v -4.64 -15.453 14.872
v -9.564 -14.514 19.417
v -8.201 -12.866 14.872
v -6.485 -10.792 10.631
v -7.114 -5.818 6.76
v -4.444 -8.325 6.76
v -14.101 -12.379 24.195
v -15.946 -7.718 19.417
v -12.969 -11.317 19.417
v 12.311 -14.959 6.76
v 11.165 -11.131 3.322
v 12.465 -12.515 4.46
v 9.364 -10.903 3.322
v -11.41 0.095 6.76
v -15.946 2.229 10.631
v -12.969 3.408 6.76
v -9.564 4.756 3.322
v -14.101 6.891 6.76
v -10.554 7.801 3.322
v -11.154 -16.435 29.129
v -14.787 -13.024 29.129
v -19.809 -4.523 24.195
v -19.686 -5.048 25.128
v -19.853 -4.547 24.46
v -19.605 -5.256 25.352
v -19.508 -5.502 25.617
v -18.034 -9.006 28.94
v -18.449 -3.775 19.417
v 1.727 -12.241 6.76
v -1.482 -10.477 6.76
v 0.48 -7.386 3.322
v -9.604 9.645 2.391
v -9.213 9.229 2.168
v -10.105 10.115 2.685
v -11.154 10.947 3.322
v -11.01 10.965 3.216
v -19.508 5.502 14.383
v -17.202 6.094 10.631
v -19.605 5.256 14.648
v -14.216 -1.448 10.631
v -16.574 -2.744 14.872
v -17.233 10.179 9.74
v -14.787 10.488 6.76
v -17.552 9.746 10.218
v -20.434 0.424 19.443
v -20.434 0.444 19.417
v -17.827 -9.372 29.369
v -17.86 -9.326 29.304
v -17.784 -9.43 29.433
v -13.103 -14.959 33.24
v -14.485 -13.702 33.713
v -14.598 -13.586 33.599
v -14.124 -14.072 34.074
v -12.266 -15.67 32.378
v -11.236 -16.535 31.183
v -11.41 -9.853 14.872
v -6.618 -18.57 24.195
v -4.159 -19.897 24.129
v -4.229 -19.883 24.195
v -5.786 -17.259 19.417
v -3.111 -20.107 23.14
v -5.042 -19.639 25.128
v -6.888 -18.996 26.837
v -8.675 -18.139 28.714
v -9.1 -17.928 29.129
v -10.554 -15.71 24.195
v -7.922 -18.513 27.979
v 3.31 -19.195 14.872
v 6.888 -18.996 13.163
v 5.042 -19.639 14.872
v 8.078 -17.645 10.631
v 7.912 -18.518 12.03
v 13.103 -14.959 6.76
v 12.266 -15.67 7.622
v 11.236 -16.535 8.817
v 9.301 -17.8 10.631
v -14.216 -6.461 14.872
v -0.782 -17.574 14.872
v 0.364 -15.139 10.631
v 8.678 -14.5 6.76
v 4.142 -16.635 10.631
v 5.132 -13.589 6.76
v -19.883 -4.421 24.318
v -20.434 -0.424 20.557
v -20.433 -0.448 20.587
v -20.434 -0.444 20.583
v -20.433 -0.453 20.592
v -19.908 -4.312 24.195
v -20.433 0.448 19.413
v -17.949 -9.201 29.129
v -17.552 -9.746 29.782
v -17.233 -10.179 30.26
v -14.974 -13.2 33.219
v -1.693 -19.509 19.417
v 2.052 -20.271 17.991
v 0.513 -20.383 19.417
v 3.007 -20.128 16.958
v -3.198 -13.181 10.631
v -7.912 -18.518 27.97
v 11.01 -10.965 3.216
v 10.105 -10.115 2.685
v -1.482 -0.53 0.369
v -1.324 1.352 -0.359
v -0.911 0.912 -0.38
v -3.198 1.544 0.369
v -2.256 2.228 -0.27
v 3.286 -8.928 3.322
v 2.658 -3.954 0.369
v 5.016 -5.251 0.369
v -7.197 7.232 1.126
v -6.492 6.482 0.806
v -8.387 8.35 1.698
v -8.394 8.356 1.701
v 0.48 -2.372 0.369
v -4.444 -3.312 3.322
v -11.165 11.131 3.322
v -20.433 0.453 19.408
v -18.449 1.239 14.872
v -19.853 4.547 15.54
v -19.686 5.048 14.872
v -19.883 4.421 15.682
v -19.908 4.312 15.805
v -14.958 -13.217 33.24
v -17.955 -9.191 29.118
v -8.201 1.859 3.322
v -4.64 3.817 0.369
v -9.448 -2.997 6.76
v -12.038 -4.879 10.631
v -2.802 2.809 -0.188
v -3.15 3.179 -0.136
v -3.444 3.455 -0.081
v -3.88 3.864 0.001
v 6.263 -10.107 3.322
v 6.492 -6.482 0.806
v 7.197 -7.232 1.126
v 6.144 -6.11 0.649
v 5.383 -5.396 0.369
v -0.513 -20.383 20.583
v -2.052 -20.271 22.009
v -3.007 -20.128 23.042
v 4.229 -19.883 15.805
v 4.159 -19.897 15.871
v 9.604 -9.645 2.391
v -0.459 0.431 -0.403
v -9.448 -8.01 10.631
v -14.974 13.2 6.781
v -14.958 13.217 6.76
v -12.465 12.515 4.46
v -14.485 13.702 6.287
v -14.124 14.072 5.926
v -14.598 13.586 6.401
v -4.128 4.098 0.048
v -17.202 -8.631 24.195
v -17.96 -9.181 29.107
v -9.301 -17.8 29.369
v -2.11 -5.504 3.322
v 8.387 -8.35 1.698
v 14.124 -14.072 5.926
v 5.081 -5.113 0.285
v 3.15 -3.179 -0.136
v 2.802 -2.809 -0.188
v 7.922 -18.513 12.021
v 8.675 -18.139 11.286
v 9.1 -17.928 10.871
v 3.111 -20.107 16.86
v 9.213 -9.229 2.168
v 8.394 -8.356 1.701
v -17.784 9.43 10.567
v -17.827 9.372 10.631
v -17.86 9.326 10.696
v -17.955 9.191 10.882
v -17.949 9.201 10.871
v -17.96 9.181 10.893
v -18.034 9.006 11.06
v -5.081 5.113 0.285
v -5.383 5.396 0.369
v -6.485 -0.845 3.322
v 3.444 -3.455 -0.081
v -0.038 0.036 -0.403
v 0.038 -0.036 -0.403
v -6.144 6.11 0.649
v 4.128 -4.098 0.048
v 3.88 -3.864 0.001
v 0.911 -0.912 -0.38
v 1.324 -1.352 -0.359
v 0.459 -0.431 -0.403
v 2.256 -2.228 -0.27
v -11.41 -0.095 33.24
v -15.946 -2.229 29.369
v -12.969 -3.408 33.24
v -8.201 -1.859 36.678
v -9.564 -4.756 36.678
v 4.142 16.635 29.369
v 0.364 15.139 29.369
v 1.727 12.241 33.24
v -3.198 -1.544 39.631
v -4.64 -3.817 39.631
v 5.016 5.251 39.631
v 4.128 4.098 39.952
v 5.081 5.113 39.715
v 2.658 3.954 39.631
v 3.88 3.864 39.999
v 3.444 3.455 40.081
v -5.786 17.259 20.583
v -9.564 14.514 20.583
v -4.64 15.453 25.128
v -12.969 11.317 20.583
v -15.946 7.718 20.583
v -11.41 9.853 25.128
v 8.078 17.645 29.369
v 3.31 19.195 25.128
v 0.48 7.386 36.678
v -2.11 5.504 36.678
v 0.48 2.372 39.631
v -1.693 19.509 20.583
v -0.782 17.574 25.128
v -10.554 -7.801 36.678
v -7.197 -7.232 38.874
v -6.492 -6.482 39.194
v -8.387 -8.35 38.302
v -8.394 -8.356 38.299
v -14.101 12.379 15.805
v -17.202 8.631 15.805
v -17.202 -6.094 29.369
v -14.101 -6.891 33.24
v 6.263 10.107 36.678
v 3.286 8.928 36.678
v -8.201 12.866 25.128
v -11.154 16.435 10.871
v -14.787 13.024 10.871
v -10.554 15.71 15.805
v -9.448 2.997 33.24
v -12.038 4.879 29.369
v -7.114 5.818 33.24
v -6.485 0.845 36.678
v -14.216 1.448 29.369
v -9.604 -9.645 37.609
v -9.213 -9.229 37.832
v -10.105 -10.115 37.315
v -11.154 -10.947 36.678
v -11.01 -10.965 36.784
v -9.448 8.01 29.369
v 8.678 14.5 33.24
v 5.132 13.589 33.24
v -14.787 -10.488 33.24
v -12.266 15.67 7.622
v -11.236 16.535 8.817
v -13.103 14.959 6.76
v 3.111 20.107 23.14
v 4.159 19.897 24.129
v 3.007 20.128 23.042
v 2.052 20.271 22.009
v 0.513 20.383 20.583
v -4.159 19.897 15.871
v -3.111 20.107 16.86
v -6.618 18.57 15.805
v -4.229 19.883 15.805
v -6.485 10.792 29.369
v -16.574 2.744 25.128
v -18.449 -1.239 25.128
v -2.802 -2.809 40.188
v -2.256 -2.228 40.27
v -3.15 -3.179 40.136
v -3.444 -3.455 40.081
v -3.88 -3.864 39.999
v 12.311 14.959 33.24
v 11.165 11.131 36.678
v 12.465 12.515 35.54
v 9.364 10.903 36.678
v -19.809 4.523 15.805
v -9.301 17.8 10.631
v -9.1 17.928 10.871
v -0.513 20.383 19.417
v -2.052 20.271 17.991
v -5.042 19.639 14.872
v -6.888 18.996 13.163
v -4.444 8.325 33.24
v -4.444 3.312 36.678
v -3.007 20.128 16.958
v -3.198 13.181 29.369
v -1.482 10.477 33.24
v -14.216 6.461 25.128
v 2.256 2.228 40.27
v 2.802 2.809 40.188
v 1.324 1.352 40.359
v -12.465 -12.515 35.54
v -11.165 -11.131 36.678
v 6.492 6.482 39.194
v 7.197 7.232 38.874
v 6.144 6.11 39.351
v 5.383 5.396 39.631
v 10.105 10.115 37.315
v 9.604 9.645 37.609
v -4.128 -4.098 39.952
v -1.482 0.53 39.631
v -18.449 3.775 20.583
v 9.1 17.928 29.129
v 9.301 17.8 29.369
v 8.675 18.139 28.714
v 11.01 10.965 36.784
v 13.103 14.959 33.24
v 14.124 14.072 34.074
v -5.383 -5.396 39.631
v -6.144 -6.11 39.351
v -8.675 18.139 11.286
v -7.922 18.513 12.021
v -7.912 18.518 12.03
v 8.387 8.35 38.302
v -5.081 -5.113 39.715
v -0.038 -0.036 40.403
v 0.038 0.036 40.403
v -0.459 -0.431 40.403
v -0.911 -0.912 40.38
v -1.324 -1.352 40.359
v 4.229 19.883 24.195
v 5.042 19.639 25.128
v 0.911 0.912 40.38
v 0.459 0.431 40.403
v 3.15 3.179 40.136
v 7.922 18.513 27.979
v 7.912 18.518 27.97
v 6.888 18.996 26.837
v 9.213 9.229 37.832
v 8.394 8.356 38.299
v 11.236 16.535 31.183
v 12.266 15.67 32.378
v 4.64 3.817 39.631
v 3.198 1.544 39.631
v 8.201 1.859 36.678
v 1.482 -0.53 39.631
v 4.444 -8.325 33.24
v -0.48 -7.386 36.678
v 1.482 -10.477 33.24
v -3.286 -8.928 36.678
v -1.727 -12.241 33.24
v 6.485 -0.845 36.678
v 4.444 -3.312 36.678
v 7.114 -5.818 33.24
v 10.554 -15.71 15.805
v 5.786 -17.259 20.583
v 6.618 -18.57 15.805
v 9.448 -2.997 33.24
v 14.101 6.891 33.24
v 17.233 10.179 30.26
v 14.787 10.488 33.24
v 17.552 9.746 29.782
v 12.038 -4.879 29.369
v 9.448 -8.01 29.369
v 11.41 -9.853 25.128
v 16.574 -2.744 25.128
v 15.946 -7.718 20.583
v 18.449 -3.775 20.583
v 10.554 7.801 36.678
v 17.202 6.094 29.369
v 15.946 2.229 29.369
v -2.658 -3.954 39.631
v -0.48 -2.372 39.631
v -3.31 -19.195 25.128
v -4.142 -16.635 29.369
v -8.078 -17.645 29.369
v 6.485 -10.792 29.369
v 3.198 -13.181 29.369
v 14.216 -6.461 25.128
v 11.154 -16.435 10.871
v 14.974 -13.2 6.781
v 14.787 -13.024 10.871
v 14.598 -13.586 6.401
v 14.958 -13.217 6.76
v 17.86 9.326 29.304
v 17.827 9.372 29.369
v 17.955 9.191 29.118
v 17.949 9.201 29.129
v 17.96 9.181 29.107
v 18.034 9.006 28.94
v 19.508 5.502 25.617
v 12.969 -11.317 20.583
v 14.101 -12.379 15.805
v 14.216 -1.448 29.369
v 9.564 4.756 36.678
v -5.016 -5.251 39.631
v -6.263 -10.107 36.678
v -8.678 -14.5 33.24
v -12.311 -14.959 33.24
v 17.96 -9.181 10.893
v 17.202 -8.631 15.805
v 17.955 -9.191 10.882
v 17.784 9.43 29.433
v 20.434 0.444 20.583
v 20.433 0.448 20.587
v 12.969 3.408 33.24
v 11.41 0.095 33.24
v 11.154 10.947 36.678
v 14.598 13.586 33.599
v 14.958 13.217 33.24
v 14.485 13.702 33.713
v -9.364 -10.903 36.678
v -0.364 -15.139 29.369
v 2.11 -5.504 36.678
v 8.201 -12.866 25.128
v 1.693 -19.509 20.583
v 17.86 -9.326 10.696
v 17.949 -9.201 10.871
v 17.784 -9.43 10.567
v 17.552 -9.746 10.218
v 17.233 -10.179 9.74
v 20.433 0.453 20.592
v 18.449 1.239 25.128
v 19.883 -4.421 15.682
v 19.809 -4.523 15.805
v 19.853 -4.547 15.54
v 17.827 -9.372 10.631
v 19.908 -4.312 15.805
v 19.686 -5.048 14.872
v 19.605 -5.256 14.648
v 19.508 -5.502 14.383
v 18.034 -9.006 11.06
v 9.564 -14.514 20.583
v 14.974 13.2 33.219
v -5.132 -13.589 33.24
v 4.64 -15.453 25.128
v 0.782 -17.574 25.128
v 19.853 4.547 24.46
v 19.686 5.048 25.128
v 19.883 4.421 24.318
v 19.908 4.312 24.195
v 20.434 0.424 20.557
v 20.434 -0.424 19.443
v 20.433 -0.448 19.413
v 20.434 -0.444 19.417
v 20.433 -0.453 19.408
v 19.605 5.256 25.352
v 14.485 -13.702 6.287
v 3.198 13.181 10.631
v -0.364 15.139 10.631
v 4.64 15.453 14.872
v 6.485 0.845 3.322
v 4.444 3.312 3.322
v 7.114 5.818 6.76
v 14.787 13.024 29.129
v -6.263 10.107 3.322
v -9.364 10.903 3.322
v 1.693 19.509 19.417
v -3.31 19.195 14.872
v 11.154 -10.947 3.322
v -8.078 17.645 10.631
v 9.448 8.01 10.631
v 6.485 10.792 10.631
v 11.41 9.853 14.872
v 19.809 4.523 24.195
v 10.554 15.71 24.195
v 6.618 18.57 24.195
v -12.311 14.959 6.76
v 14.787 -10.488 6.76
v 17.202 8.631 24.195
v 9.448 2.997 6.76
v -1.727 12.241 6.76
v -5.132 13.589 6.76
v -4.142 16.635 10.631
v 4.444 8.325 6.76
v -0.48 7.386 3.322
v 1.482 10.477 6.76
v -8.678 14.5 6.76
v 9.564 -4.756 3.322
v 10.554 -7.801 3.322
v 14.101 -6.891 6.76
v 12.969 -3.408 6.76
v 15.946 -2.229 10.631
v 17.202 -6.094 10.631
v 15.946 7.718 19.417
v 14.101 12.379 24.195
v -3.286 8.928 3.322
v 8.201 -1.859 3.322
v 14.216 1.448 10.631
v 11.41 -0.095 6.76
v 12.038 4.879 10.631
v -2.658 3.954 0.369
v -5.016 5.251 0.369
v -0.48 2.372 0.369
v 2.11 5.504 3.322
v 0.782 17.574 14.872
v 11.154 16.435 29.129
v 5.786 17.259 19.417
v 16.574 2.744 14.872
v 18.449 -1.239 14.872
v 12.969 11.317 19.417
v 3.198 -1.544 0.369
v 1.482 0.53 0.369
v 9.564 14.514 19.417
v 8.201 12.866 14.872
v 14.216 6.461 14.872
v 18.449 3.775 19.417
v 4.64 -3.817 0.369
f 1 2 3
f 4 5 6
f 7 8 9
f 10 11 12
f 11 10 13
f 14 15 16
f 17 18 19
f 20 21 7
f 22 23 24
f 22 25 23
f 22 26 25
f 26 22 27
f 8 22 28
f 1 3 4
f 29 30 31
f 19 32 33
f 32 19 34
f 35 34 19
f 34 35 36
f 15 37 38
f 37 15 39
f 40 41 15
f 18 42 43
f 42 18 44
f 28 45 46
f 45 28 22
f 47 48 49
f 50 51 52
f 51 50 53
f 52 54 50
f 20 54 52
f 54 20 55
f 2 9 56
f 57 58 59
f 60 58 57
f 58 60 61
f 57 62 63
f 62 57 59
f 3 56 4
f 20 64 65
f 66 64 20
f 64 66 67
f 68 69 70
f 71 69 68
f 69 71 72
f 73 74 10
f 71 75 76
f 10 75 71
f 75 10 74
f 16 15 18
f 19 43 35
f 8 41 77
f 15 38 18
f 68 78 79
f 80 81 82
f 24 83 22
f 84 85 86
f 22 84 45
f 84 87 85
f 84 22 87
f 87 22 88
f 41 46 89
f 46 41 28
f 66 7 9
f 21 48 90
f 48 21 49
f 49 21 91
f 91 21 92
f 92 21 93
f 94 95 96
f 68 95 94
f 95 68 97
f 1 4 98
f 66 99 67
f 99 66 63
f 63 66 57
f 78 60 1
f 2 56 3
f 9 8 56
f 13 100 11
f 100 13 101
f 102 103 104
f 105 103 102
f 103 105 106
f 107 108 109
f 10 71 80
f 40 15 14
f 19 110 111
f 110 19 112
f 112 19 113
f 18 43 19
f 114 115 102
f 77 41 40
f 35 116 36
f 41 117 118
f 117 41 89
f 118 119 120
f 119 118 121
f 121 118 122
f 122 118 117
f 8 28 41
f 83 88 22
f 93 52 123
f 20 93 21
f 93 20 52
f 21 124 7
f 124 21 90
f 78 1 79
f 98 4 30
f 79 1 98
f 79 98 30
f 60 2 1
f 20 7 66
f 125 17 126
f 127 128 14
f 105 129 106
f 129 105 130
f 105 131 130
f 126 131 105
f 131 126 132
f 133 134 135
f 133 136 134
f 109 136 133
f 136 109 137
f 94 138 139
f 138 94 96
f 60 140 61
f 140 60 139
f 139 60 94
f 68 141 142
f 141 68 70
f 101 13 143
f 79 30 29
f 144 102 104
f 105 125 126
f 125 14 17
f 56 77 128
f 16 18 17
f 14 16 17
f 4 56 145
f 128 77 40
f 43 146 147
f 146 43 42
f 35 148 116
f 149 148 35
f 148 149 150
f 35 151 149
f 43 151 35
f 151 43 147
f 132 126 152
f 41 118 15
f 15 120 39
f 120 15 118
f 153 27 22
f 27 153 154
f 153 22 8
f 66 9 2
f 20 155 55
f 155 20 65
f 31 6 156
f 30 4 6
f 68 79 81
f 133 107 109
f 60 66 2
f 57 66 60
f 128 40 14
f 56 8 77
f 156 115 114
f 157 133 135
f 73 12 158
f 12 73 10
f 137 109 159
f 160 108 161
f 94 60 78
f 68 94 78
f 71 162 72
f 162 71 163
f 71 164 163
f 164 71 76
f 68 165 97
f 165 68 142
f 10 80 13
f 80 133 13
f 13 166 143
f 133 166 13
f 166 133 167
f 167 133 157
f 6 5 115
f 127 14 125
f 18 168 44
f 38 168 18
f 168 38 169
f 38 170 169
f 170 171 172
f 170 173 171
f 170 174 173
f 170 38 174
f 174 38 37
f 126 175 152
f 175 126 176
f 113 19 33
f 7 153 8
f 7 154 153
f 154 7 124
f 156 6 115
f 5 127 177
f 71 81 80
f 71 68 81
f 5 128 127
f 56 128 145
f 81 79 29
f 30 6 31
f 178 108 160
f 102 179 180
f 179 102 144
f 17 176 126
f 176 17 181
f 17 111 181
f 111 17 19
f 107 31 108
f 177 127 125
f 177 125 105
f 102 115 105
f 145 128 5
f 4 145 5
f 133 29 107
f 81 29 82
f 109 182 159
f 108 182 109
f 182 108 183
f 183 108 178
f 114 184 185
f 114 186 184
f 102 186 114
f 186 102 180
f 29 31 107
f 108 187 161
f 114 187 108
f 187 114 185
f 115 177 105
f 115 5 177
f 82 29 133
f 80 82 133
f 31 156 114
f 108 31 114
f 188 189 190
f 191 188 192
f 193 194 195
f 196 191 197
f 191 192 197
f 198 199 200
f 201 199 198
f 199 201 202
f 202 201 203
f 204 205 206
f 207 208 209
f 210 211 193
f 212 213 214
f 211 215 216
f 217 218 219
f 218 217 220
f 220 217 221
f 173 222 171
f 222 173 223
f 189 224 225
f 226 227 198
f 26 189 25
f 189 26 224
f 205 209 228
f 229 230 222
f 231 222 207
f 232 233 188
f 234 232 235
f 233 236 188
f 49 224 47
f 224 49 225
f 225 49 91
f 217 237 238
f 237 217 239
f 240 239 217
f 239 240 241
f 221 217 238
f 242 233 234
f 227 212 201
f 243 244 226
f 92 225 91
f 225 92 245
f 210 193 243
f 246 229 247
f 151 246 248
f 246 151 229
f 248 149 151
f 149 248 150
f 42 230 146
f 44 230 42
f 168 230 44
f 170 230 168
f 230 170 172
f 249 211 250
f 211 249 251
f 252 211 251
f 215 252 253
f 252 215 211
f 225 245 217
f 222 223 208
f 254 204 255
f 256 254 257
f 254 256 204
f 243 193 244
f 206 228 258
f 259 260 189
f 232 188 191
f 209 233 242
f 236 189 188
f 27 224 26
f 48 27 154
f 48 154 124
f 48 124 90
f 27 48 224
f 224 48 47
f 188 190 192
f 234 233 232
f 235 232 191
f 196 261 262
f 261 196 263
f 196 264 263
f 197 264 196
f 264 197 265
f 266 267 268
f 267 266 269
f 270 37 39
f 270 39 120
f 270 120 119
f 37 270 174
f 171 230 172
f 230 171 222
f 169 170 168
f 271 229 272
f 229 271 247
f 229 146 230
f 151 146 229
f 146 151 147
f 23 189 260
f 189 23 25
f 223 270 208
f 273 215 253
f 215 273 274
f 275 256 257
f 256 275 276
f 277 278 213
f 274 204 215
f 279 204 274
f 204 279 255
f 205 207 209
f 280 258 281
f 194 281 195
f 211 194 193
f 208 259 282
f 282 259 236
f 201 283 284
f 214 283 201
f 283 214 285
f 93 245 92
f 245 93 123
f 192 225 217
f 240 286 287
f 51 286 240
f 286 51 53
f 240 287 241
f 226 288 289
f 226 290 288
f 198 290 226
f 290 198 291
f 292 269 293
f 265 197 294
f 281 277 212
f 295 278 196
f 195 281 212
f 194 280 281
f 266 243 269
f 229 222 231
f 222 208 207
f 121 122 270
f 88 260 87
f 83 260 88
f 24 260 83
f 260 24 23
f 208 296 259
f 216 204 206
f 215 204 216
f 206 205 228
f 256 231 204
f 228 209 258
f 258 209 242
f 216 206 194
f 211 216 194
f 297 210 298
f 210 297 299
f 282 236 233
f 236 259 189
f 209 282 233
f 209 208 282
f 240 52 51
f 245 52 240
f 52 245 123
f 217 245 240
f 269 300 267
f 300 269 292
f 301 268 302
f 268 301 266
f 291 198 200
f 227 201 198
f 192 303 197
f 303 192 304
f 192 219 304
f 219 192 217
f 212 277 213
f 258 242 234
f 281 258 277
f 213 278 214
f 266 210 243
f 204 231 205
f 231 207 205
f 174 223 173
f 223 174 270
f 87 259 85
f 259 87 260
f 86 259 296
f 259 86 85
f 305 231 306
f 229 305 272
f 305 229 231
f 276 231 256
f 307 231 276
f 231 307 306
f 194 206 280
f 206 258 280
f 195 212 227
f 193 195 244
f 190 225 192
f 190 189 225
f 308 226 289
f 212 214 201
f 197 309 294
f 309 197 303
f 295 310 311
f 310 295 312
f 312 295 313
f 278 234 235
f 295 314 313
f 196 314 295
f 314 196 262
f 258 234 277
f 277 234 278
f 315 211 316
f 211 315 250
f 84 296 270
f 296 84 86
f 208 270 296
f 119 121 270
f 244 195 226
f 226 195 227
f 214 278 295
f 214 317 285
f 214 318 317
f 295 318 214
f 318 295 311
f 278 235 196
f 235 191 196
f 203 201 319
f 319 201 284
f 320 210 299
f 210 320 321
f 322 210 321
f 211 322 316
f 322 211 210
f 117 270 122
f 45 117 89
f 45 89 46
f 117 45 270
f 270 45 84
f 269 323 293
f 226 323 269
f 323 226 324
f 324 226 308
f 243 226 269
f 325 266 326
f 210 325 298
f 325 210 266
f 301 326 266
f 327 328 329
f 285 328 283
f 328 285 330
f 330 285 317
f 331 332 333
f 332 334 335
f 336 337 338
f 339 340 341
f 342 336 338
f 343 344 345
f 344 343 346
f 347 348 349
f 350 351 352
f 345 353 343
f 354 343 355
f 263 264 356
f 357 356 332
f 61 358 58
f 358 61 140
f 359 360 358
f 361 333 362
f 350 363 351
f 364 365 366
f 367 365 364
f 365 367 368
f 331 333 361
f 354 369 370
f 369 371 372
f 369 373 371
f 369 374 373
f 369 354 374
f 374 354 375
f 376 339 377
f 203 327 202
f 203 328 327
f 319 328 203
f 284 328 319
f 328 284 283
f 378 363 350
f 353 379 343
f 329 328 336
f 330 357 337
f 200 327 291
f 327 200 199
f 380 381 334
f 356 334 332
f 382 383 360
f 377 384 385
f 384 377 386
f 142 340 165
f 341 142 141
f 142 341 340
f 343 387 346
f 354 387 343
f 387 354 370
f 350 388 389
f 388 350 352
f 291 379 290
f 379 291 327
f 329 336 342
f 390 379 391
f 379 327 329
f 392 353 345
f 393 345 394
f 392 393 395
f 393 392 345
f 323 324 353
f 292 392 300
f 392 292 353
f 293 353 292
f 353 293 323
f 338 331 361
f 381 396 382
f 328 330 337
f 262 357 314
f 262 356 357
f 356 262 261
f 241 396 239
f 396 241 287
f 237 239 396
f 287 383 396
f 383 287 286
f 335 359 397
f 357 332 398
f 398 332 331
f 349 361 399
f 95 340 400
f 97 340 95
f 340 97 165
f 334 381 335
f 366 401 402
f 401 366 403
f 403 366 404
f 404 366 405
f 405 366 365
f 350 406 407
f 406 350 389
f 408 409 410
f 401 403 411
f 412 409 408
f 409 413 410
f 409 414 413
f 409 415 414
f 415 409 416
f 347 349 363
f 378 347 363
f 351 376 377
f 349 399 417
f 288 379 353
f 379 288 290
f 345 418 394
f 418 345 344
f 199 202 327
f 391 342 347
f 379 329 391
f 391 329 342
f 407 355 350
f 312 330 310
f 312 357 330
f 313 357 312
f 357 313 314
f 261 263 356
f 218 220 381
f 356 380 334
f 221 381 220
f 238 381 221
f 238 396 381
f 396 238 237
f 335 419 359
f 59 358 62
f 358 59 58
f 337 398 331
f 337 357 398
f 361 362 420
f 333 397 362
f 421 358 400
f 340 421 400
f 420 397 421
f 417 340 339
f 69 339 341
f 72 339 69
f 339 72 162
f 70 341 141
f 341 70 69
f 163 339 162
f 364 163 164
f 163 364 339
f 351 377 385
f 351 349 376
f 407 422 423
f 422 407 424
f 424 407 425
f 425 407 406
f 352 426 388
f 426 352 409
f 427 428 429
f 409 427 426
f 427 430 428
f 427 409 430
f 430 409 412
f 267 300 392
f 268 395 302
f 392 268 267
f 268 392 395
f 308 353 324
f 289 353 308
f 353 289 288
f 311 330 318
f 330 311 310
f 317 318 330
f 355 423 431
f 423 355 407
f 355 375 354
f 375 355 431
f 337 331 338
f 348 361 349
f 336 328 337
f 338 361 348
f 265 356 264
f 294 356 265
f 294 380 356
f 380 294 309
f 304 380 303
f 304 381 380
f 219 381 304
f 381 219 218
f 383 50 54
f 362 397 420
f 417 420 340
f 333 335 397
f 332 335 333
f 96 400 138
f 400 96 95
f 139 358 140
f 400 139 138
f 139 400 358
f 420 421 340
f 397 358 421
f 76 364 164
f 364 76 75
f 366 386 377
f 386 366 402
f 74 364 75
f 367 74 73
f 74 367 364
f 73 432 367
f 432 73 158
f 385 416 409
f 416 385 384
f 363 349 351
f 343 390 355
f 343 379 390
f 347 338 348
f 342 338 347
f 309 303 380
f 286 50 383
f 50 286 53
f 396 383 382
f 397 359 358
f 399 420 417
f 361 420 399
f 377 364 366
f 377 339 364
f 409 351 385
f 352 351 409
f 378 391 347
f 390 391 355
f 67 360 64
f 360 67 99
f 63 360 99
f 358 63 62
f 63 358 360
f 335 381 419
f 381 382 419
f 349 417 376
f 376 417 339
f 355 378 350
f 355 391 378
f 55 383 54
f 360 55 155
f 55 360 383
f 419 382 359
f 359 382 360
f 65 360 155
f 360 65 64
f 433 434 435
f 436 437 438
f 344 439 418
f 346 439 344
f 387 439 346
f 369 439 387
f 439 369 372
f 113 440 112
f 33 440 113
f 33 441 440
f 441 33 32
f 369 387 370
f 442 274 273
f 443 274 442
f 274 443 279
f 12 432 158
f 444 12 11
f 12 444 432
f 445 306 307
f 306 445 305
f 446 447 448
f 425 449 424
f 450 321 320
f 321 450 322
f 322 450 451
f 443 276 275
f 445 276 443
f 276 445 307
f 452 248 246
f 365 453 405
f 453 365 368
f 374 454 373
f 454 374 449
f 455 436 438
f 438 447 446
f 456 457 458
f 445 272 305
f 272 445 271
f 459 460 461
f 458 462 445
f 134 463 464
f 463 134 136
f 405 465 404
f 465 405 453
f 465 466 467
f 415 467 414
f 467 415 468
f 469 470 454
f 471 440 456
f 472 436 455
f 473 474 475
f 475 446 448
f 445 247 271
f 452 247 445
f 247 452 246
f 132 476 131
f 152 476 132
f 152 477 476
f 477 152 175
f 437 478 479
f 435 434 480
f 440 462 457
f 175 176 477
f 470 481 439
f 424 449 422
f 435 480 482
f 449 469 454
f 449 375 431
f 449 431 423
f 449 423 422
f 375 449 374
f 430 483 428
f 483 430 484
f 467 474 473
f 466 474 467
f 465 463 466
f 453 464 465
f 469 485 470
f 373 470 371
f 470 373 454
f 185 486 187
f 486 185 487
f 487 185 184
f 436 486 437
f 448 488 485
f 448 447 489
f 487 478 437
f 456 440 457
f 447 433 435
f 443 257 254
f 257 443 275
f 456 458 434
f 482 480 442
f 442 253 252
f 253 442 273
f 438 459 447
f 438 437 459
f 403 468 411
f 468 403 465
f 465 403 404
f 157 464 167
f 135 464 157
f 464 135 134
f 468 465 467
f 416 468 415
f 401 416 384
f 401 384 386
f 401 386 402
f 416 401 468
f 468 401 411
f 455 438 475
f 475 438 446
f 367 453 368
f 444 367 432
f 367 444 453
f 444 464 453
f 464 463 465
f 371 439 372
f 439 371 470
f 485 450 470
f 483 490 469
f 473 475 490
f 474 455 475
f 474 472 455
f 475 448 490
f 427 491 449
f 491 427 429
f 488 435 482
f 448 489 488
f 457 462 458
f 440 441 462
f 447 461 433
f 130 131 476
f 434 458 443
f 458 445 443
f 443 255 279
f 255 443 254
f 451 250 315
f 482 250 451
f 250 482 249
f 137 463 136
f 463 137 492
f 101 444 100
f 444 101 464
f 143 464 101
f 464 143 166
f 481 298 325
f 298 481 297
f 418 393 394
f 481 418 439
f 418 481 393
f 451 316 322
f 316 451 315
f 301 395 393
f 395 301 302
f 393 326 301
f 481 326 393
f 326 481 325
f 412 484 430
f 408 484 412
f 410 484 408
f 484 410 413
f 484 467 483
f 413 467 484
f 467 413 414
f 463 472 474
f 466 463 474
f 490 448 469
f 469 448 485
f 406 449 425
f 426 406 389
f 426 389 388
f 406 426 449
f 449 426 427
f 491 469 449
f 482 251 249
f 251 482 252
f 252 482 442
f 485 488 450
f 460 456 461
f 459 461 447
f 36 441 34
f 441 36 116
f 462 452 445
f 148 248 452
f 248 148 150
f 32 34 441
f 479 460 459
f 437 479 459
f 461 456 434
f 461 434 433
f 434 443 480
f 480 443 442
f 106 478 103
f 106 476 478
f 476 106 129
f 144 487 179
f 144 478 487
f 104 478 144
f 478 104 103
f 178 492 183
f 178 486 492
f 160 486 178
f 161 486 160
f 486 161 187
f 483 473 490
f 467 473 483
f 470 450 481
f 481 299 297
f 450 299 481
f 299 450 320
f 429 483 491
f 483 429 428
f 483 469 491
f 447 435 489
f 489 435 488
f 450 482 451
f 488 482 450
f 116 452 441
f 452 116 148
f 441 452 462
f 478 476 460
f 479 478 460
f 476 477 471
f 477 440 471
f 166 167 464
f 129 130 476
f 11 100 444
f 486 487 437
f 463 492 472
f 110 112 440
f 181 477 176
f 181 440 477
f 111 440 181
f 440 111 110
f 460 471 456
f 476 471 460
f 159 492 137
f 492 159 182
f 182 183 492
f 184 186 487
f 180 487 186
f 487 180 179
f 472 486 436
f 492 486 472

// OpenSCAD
// meissner object
// based on tetrahedron

// size of object in ALL directions
size = 40;

m = 2 * sqrt(2);

$fn = 50;

scale(size / m)
	translate([0, 0, m / 2])
		intersection() {
			translate([1, 1, 1]) sphere(m);
			translate([1, -1, -1]) sphere(m);
			translate([-1, 1, -1]) sphere(m);
			translate([-1, -1, 1]) sphere(m);
		}

// eof
